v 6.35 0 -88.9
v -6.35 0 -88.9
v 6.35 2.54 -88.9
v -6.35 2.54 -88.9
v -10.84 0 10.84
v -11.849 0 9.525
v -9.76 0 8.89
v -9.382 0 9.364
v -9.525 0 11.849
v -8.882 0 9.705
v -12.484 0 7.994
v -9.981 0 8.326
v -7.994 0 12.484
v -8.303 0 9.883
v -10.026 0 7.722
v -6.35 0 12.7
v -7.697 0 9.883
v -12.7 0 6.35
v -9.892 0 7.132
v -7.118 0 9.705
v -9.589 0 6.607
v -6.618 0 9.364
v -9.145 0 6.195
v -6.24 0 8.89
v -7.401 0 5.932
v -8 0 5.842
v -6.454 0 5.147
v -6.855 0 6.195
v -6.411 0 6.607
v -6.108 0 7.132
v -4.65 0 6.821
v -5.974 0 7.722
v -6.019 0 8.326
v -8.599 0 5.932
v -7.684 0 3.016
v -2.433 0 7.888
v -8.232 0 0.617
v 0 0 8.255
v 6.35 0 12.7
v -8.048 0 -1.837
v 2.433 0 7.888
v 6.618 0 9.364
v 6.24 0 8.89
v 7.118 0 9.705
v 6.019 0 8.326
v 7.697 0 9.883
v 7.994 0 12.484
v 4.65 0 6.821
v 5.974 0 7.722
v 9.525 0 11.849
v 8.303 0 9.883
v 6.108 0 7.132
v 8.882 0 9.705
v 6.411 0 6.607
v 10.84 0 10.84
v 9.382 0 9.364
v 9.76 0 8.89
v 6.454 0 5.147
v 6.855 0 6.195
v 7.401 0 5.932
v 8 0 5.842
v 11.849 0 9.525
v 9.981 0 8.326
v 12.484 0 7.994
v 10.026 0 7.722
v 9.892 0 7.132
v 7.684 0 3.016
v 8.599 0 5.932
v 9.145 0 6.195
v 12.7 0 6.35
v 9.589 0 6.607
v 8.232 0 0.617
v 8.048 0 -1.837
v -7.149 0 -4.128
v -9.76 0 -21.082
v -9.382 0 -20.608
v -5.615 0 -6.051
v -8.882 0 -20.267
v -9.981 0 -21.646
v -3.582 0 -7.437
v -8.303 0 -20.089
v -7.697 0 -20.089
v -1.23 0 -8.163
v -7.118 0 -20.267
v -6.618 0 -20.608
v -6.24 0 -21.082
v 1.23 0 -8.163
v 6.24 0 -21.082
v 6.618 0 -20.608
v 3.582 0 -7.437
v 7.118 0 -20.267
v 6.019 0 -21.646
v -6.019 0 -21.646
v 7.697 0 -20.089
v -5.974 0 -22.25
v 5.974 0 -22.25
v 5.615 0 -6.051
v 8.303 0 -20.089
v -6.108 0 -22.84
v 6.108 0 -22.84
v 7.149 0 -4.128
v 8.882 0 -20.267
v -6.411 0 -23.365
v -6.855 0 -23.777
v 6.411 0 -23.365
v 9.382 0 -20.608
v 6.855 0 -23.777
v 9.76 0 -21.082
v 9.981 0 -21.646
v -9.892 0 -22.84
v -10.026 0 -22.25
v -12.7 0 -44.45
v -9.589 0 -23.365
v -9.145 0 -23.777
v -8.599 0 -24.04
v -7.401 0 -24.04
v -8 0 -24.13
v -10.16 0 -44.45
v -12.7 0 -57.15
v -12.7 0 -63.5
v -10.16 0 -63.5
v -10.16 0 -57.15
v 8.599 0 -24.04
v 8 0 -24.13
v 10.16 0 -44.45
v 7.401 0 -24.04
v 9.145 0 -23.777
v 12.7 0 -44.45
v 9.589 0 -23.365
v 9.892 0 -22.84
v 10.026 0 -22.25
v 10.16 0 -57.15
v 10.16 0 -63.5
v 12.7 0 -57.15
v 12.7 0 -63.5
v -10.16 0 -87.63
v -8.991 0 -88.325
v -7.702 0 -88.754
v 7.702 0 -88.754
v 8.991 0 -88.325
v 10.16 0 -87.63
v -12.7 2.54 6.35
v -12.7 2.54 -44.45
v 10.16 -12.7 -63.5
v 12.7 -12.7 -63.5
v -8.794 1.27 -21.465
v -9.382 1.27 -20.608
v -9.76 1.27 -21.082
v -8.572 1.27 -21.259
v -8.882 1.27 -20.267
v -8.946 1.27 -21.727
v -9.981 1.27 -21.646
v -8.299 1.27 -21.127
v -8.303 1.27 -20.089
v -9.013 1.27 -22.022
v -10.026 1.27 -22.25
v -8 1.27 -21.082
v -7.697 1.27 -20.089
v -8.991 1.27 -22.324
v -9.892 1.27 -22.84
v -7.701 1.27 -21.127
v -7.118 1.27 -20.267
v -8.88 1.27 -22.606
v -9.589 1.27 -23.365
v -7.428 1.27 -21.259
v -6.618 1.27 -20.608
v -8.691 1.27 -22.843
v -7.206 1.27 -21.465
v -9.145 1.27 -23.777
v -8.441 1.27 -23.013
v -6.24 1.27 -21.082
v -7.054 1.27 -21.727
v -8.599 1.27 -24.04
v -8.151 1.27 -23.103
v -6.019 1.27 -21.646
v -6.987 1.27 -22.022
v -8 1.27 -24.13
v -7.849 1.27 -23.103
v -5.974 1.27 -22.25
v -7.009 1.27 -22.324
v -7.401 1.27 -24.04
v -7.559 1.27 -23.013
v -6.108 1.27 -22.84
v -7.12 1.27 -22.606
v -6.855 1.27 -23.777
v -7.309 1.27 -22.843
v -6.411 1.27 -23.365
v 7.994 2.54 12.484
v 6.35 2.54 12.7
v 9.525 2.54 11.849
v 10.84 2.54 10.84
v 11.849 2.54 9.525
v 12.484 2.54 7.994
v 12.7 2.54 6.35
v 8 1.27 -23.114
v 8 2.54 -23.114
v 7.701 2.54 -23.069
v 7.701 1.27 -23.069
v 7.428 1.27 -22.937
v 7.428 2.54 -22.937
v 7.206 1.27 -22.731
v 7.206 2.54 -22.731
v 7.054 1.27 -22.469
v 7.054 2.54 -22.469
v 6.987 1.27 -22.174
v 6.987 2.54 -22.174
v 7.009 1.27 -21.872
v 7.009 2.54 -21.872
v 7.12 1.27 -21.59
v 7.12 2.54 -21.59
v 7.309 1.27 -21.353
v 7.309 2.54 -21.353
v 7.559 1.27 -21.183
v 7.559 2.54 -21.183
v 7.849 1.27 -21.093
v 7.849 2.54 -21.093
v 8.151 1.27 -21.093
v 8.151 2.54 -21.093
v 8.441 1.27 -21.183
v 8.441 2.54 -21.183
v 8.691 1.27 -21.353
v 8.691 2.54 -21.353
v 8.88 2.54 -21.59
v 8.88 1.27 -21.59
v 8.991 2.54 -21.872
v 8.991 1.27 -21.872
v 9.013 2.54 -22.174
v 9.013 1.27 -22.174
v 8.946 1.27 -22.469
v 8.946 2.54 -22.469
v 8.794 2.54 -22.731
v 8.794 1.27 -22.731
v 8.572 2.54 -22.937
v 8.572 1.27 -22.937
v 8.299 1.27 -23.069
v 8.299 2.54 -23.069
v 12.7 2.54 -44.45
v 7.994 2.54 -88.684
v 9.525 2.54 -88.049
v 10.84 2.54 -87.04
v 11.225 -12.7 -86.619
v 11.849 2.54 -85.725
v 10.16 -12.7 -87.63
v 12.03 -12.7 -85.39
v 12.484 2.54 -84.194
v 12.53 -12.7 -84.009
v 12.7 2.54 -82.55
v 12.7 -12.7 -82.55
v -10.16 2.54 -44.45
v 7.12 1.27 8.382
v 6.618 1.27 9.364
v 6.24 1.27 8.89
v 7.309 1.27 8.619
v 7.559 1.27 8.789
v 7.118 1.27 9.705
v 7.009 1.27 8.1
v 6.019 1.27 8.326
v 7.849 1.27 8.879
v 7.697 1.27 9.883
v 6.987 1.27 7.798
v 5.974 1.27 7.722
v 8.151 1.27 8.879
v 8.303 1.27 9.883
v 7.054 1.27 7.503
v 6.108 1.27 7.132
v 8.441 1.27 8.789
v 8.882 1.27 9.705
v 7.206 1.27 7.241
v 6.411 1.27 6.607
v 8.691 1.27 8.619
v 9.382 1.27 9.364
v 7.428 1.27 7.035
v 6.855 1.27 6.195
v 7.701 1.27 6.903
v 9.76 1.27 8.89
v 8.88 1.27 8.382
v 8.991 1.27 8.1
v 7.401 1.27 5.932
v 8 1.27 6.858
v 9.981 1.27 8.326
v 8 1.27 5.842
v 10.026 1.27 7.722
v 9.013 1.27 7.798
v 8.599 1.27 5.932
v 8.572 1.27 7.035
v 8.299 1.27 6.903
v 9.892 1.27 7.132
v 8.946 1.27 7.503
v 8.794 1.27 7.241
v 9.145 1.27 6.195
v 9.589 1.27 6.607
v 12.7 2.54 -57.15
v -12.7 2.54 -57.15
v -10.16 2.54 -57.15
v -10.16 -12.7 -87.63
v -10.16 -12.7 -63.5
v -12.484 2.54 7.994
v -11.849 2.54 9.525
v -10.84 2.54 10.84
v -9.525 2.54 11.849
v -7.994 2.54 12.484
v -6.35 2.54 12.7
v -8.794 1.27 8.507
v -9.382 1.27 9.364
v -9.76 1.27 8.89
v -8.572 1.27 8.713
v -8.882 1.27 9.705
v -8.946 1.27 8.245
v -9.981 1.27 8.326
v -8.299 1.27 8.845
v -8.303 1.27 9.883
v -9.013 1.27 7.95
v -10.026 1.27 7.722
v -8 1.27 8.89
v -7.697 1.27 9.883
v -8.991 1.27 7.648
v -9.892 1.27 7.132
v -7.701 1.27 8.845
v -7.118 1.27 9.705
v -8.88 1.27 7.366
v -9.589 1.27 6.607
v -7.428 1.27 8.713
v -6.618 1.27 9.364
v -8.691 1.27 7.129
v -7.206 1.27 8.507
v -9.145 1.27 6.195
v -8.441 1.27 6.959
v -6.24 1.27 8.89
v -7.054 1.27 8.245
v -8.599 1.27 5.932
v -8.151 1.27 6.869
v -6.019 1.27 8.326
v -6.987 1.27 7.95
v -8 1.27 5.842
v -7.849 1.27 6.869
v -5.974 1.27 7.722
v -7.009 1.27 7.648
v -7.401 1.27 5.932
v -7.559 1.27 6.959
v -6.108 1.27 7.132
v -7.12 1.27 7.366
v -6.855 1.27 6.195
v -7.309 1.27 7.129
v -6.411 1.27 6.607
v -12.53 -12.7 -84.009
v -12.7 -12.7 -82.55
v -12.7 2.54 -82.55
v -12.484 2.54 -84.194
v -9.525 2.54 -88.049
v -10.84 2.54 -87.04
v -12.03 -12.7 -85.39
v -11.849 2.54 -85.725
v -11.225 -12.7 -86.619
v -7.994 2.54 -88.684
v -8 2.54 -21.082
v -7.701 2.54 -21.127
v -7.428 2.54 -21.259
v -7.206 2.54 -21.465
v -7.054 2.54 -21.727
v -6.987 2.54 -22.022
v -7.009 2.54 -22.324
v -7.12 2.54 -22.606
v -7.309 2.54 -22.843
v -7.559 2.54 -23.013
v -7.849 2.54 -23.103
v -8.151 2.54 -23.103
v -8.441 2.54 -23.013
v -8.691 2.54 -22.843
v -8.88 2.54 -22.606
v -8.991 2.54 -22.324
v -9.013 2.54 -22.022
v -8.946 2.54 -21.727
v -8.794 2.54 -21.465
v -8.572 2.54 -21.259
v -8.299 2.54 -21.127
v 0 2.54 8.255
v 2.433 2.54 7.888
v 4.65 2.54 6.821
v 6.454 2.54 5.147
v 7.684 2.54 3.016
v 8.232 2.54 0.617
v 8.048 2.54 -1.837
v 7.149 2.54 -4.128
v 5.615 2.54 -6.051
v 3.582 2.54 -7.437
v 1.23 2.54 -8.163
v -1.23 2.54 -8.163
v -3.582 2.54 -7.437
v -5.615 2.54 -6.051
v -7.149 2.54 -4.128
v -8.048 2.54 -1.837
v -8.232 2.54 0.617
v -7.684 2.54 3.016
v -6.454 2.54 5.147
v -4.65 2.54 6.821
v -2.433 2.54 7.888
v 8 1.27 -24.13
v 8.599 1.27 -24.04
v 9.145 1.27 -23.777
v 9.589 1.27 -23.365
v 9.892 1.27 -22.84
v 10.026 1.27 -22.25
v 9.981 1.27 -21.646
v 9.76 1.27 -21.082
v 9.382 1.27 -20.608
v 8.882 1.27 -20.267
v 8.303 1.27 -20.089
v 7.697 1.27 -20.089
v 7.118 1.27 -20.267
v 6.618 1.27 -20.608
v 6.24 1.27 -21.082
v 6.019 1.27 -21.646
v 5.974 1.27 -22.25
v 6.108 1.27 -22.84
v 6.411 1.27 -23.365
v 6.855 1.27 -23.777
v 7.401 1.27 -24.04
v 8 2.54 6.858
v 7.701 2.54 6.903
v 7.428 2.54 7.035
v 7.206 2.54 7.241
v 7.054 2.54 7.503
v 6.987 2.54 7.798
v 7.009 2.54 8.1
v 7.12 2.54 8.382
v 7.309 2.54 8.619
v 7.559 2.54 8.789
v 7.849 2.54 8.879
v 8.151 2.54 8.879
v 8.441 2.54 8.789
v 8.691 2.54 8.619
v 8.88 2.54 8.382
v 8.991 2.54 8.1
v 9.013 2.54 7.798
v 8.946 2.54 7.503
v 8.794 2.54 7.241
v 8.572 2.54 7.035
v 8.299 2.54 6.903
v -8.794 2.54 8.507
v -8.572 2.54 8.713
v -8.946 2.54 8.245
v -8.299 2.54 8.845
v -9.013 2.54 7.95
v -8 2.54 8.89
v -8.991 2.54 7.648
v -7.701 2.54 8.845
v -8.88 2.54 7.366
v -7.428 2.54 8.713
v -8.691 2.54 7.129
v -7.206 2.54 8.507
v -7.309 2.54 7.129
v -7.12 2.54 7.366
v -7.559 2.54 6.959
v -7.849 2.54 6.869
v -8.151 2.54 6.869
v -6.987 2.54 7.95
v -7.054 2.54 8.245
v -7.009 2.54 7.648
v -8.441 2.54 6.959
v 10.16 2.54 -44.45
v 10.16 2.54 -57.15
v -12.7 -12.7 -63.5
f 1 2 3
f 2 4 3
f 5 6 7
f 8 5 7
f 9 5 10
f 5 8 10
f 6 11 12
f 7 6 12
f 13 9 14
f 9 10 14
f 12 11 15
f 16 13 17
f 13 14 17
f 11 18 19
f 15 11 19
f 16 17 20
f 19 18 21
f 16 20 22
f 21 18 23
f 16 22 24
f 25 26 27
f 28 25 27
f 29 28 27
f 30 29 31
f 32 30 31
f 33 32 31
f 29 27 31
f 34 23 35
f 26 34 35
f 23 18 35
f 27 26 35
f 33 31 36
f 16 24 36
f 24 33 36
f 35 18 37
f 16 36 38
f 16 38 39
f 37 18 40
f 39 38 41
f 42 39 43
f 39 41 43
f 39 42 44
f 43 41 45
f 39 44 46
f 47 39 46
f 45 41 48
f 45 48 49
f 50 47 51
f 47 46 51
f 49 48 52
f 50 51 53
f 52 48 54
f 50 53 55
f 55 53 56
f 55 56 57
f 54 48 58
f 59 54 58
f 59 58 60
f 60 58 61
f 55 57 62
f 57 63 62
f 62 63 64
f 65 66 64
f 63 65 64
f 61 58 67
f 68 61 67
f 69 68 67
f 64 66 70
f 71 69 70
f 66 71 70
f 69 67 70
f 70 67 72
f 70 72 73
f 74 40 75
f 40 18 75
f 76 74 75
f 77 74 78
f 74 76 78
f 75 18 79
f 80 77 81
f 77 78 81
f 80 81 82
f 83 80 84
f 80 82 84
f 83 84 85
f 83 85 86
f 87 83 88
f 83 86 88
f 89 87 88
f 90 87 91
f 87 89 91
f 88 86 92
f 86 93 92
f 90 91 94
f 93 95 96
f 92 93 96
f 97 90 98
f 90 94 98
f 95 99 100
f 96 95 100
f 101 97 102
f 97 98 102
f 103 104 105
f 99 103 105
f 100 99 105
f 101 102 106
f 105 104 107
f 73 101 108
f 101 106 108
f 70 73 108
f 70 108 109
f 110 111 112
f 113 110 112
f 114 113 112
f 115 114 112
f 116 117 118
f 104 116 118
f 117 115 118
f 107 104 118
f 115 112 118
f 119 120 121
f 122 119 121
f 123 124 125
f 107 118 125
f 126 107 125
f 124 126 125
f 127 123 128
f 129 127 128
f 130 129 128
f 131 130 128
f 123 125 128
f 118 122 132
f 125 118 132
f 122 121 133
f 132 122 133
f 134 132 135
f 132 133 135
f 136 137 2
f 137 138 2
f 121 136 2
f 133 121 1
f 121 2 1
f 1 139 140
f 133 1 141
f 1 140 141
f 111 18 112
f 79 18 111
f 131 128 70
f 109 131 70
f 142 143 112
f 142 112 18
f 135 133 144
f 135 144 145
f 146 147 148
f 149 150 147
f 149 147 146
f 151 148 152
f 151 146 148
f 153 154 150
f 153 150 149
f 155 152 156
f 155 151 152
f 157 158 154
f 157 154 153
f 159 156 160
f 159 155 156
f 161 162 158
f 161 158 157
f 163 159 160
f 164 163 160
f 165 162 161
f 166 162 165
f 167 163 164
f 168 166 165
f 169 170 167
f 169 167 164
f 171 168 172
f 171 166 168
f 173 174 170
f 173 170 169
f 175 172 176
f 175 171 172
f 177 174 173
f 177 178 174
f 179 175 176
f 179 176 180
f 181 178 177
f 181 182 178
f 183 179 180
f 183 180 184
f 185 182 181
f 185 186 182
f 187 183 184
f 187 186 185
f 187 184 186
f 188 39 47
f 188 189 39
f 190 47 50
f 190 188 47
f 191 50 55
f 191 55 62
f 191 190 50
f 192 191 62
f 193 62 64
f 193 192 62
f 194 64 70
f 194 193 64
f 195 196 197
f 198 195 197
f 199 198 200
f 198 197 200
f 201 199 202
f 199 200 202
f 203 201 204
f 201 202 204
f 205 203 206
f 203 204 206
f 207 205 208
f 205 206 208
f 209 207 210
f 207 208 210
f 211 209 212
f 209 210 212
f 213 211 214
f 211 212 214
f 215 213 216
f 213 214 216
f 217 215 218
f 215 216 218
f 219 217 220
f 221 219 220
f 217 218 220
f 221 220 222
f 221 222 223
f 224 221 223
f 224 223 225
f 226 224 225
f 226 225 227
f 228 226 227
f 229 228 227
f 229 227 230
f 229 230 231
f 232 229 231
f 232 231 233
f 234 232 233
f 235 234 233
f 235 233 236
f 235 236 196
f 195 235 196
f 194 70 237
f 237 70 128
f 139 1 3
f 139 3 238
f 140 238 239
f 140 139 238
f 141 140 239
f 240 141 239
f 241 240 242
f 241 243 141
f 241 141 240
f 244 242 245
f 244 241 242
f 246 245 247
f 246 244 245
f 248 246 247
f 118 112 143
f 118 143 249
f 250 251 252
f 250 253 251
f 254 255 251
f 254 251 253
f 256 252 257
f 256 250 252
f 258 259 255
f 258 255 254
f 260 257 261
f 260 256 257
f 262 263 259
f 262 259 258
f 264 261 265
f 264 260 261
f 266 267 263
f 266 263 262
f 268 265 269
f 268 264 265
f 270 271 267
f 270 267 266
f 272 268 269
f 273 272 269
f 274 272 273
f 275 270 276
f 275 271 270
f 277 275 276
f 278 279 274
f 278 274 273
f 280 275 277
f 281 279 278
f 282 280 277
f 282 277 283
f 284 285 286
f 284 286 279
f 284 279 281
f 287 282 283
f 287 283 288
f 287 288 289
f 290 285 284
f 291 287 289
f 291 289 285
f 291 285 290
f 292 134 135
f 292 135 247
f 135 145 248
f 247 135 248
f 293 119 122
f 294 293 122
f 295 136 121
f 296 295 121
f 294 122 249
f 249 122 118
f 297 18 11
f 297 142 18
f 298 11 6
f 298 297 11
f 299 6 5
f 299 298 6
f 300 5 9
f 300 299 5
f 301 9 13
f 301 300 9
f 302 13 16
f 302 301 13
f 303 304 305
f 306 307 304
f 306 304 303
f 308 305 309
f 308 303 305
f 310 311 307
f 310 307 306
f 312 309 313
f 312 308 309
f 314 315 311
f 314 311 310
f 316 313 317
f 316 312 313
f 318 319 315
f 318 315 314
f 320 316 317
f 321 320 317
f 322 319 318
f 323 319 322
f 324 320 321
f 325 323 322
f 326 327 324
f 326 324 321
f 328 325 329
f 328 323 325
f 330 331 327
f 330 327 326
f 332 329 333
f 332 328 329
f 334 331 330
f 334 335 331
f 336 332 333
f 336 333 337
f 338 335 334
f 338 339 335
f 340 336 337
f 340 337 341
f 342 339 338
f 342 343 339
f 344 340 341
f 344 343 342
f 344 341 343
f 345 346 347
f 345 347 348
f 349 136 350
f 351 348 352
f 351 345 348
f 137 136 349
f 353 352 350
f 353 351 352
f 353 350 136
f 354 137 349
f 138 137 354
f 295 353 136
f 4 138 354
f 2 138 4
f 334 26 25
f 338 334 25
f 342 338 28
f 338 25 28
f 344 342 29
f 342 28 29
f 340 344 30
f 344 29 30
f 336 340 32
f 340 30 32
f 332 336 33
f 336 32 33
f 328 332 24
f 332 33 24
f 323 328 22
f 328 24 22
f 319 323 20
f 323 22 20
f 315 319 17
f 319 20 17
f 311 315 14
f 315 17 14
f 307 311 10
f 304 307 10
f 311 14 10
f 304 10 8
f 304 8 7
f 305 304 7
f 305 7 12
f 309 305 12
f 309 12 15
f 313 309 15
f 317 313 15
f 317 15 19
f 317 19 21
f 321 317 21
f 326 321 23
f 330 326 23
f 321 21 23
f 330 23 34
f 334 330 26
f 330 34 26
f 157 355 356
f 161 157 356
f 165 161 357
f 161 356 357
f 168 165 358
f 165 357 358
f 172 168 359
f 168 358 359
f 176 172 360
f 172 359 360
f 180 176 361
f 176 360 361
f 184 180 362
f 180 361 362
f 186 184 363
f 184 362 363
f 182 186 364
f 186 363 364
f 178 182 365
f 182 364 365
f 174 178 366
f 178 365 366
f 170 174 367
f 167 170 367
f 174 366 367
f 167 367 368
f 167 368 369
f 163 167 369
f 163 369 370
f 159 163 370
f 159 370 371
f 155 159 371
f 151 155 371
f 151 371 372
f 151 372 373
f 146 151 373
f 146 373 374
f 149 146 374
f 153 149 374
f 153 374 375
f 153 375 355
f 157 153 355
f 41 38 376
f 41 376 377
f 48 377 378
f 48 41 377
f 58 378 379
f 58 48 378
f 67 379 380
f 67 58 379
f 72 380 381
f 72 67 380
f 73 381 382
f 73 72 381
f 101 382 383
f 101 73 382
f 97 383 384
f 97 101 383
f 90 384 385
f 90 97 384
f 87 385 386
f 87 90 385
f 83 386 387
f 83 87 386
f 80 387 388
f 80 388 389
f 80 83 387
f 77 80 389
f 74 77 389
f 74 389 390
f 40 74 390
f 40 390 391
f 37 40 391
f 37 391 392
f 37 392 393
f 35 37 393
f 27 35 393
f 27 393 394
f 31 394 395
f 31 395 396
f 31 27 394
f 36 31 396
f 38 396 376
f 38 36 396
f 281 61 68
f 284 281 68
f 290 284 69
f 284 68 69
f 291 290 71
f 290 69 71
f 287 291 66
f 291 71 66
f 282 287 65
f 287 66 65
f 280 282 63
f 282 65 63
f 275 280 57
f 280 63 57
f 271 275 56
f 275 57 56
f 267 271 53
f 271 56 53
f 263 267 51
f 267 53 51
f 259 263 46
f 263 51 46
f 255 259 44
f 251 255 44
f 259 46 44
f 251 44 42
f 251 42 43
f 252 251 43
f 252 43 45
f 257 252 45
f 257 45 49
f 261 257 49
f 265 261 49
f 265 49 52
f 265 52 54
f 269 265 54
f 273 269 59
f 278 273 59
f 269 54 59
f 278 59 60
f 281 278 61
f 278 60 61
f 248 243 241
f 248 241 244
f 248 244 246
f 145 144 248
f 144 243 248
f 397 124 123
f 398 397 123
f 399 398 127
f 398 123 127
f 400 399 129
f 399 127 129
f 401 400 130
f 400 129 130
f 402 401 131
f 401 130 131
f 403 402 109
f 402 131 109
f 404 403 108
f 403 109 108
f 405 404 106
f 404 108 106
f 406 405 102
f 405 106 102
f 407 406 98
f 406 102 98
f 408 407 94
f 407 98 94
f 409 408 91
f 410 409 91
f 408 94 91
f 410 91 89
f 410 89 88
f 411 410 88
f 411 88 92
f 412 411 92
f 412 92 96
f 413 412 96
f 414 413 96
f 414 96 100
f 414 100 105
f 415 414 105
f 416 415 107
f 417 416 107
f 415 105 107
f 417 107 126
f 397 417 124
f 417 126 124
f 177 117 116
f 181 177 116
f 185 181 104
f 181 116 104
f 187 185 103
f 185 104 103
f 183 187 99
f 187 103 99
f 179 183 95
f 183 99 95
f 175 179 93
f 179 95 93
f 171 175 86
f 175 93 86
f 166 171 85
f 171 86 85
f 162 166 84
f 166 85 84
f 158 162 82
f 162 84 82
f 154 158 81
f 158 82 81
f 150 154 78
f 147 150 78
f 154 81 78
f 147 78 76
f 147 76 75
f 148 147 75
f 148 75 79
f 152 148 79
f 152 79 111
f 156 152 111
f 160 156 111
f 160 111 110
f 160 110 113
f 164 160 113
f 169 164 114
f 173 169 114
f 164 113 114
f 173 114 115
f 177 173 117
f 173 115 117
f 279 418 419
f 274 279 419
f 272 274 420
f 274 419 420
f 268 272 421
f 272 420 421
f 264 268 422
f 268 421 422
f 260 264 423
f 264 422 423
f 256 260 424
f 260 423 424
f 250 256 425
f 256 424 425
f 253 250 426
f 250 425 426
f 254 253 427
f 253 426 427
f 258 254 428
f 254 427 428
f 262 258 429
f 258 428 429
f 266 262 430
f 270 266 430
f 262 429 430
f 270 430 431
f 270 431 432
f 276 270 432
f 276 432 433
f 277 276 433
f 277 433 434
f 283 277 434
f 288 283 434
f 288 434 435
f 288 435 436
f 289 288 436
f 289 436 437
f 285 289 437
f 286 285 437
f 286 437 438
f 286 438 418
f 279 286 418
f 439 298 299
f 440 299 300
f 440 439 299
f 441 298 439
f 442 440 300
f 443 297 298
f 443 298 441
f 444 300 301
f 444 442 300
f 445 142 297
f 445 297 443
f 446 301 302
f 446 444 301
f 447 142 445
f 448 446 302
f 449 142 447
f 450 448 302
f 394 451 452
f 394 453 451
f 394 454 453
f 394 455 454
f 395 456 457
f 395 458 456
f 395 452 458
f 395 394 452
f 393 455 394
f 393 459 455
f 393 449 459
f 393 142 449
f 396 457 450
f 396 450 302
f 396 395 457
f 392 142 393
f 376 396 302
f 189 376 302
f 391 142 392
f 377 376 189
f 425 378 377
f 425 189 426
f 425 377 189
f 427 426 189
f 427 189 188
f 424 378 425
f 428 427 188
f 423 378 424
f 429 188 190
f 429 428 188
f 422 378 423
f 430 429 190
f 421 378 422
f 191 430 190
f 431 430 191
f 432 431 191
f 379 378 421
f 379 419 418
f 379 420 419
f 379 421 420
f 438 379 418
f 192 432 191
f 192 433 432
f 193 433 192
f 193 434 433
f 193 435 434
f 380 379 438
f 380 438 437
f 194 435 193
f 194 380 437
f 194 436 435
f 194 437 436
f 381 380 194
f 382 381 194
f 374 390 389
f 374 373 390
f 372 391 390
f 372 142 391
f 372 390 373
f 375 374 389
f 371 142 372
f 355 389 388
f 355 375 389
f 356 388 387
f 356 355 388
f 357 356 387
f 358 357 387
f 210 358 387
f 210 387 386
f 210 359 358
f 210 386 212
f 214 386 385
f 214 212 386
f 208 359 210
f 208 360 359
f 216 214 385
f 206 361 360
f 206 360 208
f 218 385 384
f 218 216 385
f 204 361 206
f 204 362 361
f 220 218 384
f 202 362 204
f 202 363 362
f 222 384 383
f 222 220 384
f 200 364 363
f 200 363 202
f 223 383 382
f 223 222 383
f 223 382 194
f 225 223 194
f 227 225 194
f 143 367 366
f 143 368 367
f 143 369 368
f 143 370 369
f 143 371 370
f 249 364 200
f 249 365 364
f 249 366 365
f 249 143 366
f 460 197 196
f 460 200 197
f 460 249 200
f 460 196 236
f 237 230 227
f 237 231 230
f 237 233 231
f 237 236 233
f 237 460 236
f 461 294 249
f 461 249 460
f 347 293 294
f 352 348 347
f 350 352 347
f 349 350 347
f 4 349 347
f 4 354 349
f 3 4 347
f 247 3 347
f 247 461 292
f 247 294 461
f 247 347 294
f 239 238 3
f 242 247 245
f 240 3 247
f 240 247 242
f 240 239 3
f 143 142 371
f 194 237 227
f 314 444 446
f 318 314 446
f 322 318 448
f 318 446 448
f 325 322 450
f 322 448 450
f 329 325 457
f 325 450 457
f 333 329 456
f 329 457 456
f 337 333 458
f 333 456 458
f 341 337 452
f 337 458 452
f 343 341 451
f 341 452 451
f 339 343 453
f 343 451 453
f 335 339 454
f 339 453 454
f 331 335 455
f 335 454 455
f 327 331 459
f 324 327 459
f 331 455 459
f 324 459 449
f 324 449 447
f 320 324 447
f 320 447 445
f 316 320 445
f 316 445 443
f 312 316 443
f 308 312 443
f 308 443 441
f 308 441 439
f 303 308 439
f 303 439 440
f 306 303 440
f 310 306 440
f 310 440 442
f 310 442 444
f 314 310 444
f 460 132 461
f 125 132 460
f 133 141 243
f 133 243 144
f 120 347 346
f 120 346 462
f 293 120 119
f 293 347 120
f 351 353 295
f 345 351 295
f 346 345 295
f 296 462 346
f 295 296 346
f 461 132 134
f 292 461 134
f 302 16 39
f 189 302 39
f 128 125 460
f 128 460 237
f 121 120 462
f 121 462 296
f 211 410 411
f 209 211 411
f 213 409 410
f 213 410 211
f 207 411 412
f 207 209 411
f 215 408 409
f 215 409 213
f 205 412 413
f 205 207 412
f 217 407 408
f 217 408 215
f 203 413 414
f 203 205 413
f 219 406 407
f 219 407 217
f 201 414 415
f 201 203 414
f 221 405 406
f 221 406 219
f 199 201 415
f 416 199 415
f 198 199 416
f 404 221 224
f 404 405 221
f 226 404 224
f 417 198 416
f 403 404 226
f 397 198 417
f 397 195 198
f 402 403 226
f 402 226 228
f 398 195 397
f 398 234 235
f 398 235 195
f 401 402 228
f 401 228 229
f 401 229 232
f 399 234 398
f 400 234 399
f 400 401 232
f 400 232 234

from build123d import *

# Parameters (mm, degrees)
SKETCH1_W           = 25.4
SKETCH1_H           = 101.6
SKETCH1_R           = 8.255
BOSS_EXTRUDE1_DEPTH = 2.54
SKETCH3_W           = 2.54
SKETCH3_H           = 25.4
BOSS_EXTRUDE2_DEPTH = 12.7
SKETCH2_R           = 1.016
CUT_EXTRUDE3_DEPTH  = 12.7
FILLET1_R           = 6.35
SKETCH5_R           = 2.032
CUT_EXTRUDE4_DEPTH  = 1.27
SKETCH6_W           = 2.54
SKETCH6_H           = 12.7
CUT_EXTRUDE5_DEPTH  = 91.696141042


with BuildPart() as part:
    # Sketch1 → Boss-Extrude1 (new body)
    with BuildSketch(Plane(origin=(0, 0, 0), x_dir=(1, 0, 0), z_dir=(0, 1, 0))):
        with Locations((0, 38.1)):
            Rectangle(SKETCH1_W, SKETCH1_H)
        with Locations(Location((0, 0, 0), (0, 0, 270))):
            Circle(SKETCH1_R, mode=Mode.SUBTRACT)
    extrude(amount=BOSS_EXTRUDE1_DEPTH)

    # Sketch3 → Boss-Extrude2 (add)
    with BuildSketch(Plane.XZ):
        with Locations((-11.43, -76.2)):
            Rectangle(SKETCH3_W, SKETCH3_H)
        with Locations((11.43, -76.2)):
            Rectangle(SKETCH3_W, SKETCH3_H)
    extrude(amount=BOSS_EXTRUDE2_DEPTH)

    # Sketch2 → Cut-Extrude3 (cut)
    with BuildSketch(Plane(origin=(0, 2.54, 0), x_dir=(1, 0, 0), z_dir=(0, 1, 0))):
        with Locations(Location((-8.000000002, 22.098, 0), (0, 0, 270))):
            Circle(SKETCH2_R)
        with Locations(Location((8.000000002, 22.098, 0), (0, 0, 90))):
            Circle(SKETCH2_R)
        with Locations(Location((-8.000000002, -7.874, 0), (0, 0, 270))):
            Circle(SKETCH2_R)
        with Locations(Location((8.000000002, -7.874, 0), (0, 0, 90))):
            Circle(SKETCH2_R)
    extrude(amount=-CUT_EXTRUDE3_DEPTH, mode=Mode.SUBTRACT)

    # Fillet1
    fillet1_edges = [part.edges().sort_by_distance(p)[0] for p in [
        (12.7, 1.27, 12.7),
        (-12.7, 1.27, 12.7),
        (12.7, -5.08, -88.9),
        (-12.7, -5.08, -88.9),
    ]]
    fillet(fillet1_edges, radius=FILLET1_R)

    # Sketch5 → Cut-Extrude4 (cut)
    with BuildSketch(Plane.XZ):
        with Locations(Location((-8.000000002, -22.098, 0), (0, 0, 270))):
            Circle(SKETCH5_R)
        with Locations(Location((-8.000000002, 7.874, 0), (0, 0, 270))):
            Circle(SKETCH5_R)
        with Locations(Location((8.000000002, -22.098, 0), (0, 0, 270))):
            Circle(SKETCH5_R)
        with Locations(Location((8.000000002, 7.874, 0), (0, 0, 270))):
            Circle(SKETCH5_R)
    extrude(amount=-CUT_EXTRUDE4_DEPTH, mode=Mode.SUBTRACT)

    # Sketch6 → Cut-Extrude5 (cut, through all)
    with BuildSketch(Plane.XZ):
        with Locations((11.43, -50.8)):
            Rectangle(SKETCH6_W, SKETCH6_H)
        with Locations((-11.43, -50.8)):
            Rectangle(SKETCH6_W, SKETCH6_H)
    extrude(amount=-CUT_EXTRUDE5_DEPTH, mode=Mode.SUBTRACT)


solid = part.part
